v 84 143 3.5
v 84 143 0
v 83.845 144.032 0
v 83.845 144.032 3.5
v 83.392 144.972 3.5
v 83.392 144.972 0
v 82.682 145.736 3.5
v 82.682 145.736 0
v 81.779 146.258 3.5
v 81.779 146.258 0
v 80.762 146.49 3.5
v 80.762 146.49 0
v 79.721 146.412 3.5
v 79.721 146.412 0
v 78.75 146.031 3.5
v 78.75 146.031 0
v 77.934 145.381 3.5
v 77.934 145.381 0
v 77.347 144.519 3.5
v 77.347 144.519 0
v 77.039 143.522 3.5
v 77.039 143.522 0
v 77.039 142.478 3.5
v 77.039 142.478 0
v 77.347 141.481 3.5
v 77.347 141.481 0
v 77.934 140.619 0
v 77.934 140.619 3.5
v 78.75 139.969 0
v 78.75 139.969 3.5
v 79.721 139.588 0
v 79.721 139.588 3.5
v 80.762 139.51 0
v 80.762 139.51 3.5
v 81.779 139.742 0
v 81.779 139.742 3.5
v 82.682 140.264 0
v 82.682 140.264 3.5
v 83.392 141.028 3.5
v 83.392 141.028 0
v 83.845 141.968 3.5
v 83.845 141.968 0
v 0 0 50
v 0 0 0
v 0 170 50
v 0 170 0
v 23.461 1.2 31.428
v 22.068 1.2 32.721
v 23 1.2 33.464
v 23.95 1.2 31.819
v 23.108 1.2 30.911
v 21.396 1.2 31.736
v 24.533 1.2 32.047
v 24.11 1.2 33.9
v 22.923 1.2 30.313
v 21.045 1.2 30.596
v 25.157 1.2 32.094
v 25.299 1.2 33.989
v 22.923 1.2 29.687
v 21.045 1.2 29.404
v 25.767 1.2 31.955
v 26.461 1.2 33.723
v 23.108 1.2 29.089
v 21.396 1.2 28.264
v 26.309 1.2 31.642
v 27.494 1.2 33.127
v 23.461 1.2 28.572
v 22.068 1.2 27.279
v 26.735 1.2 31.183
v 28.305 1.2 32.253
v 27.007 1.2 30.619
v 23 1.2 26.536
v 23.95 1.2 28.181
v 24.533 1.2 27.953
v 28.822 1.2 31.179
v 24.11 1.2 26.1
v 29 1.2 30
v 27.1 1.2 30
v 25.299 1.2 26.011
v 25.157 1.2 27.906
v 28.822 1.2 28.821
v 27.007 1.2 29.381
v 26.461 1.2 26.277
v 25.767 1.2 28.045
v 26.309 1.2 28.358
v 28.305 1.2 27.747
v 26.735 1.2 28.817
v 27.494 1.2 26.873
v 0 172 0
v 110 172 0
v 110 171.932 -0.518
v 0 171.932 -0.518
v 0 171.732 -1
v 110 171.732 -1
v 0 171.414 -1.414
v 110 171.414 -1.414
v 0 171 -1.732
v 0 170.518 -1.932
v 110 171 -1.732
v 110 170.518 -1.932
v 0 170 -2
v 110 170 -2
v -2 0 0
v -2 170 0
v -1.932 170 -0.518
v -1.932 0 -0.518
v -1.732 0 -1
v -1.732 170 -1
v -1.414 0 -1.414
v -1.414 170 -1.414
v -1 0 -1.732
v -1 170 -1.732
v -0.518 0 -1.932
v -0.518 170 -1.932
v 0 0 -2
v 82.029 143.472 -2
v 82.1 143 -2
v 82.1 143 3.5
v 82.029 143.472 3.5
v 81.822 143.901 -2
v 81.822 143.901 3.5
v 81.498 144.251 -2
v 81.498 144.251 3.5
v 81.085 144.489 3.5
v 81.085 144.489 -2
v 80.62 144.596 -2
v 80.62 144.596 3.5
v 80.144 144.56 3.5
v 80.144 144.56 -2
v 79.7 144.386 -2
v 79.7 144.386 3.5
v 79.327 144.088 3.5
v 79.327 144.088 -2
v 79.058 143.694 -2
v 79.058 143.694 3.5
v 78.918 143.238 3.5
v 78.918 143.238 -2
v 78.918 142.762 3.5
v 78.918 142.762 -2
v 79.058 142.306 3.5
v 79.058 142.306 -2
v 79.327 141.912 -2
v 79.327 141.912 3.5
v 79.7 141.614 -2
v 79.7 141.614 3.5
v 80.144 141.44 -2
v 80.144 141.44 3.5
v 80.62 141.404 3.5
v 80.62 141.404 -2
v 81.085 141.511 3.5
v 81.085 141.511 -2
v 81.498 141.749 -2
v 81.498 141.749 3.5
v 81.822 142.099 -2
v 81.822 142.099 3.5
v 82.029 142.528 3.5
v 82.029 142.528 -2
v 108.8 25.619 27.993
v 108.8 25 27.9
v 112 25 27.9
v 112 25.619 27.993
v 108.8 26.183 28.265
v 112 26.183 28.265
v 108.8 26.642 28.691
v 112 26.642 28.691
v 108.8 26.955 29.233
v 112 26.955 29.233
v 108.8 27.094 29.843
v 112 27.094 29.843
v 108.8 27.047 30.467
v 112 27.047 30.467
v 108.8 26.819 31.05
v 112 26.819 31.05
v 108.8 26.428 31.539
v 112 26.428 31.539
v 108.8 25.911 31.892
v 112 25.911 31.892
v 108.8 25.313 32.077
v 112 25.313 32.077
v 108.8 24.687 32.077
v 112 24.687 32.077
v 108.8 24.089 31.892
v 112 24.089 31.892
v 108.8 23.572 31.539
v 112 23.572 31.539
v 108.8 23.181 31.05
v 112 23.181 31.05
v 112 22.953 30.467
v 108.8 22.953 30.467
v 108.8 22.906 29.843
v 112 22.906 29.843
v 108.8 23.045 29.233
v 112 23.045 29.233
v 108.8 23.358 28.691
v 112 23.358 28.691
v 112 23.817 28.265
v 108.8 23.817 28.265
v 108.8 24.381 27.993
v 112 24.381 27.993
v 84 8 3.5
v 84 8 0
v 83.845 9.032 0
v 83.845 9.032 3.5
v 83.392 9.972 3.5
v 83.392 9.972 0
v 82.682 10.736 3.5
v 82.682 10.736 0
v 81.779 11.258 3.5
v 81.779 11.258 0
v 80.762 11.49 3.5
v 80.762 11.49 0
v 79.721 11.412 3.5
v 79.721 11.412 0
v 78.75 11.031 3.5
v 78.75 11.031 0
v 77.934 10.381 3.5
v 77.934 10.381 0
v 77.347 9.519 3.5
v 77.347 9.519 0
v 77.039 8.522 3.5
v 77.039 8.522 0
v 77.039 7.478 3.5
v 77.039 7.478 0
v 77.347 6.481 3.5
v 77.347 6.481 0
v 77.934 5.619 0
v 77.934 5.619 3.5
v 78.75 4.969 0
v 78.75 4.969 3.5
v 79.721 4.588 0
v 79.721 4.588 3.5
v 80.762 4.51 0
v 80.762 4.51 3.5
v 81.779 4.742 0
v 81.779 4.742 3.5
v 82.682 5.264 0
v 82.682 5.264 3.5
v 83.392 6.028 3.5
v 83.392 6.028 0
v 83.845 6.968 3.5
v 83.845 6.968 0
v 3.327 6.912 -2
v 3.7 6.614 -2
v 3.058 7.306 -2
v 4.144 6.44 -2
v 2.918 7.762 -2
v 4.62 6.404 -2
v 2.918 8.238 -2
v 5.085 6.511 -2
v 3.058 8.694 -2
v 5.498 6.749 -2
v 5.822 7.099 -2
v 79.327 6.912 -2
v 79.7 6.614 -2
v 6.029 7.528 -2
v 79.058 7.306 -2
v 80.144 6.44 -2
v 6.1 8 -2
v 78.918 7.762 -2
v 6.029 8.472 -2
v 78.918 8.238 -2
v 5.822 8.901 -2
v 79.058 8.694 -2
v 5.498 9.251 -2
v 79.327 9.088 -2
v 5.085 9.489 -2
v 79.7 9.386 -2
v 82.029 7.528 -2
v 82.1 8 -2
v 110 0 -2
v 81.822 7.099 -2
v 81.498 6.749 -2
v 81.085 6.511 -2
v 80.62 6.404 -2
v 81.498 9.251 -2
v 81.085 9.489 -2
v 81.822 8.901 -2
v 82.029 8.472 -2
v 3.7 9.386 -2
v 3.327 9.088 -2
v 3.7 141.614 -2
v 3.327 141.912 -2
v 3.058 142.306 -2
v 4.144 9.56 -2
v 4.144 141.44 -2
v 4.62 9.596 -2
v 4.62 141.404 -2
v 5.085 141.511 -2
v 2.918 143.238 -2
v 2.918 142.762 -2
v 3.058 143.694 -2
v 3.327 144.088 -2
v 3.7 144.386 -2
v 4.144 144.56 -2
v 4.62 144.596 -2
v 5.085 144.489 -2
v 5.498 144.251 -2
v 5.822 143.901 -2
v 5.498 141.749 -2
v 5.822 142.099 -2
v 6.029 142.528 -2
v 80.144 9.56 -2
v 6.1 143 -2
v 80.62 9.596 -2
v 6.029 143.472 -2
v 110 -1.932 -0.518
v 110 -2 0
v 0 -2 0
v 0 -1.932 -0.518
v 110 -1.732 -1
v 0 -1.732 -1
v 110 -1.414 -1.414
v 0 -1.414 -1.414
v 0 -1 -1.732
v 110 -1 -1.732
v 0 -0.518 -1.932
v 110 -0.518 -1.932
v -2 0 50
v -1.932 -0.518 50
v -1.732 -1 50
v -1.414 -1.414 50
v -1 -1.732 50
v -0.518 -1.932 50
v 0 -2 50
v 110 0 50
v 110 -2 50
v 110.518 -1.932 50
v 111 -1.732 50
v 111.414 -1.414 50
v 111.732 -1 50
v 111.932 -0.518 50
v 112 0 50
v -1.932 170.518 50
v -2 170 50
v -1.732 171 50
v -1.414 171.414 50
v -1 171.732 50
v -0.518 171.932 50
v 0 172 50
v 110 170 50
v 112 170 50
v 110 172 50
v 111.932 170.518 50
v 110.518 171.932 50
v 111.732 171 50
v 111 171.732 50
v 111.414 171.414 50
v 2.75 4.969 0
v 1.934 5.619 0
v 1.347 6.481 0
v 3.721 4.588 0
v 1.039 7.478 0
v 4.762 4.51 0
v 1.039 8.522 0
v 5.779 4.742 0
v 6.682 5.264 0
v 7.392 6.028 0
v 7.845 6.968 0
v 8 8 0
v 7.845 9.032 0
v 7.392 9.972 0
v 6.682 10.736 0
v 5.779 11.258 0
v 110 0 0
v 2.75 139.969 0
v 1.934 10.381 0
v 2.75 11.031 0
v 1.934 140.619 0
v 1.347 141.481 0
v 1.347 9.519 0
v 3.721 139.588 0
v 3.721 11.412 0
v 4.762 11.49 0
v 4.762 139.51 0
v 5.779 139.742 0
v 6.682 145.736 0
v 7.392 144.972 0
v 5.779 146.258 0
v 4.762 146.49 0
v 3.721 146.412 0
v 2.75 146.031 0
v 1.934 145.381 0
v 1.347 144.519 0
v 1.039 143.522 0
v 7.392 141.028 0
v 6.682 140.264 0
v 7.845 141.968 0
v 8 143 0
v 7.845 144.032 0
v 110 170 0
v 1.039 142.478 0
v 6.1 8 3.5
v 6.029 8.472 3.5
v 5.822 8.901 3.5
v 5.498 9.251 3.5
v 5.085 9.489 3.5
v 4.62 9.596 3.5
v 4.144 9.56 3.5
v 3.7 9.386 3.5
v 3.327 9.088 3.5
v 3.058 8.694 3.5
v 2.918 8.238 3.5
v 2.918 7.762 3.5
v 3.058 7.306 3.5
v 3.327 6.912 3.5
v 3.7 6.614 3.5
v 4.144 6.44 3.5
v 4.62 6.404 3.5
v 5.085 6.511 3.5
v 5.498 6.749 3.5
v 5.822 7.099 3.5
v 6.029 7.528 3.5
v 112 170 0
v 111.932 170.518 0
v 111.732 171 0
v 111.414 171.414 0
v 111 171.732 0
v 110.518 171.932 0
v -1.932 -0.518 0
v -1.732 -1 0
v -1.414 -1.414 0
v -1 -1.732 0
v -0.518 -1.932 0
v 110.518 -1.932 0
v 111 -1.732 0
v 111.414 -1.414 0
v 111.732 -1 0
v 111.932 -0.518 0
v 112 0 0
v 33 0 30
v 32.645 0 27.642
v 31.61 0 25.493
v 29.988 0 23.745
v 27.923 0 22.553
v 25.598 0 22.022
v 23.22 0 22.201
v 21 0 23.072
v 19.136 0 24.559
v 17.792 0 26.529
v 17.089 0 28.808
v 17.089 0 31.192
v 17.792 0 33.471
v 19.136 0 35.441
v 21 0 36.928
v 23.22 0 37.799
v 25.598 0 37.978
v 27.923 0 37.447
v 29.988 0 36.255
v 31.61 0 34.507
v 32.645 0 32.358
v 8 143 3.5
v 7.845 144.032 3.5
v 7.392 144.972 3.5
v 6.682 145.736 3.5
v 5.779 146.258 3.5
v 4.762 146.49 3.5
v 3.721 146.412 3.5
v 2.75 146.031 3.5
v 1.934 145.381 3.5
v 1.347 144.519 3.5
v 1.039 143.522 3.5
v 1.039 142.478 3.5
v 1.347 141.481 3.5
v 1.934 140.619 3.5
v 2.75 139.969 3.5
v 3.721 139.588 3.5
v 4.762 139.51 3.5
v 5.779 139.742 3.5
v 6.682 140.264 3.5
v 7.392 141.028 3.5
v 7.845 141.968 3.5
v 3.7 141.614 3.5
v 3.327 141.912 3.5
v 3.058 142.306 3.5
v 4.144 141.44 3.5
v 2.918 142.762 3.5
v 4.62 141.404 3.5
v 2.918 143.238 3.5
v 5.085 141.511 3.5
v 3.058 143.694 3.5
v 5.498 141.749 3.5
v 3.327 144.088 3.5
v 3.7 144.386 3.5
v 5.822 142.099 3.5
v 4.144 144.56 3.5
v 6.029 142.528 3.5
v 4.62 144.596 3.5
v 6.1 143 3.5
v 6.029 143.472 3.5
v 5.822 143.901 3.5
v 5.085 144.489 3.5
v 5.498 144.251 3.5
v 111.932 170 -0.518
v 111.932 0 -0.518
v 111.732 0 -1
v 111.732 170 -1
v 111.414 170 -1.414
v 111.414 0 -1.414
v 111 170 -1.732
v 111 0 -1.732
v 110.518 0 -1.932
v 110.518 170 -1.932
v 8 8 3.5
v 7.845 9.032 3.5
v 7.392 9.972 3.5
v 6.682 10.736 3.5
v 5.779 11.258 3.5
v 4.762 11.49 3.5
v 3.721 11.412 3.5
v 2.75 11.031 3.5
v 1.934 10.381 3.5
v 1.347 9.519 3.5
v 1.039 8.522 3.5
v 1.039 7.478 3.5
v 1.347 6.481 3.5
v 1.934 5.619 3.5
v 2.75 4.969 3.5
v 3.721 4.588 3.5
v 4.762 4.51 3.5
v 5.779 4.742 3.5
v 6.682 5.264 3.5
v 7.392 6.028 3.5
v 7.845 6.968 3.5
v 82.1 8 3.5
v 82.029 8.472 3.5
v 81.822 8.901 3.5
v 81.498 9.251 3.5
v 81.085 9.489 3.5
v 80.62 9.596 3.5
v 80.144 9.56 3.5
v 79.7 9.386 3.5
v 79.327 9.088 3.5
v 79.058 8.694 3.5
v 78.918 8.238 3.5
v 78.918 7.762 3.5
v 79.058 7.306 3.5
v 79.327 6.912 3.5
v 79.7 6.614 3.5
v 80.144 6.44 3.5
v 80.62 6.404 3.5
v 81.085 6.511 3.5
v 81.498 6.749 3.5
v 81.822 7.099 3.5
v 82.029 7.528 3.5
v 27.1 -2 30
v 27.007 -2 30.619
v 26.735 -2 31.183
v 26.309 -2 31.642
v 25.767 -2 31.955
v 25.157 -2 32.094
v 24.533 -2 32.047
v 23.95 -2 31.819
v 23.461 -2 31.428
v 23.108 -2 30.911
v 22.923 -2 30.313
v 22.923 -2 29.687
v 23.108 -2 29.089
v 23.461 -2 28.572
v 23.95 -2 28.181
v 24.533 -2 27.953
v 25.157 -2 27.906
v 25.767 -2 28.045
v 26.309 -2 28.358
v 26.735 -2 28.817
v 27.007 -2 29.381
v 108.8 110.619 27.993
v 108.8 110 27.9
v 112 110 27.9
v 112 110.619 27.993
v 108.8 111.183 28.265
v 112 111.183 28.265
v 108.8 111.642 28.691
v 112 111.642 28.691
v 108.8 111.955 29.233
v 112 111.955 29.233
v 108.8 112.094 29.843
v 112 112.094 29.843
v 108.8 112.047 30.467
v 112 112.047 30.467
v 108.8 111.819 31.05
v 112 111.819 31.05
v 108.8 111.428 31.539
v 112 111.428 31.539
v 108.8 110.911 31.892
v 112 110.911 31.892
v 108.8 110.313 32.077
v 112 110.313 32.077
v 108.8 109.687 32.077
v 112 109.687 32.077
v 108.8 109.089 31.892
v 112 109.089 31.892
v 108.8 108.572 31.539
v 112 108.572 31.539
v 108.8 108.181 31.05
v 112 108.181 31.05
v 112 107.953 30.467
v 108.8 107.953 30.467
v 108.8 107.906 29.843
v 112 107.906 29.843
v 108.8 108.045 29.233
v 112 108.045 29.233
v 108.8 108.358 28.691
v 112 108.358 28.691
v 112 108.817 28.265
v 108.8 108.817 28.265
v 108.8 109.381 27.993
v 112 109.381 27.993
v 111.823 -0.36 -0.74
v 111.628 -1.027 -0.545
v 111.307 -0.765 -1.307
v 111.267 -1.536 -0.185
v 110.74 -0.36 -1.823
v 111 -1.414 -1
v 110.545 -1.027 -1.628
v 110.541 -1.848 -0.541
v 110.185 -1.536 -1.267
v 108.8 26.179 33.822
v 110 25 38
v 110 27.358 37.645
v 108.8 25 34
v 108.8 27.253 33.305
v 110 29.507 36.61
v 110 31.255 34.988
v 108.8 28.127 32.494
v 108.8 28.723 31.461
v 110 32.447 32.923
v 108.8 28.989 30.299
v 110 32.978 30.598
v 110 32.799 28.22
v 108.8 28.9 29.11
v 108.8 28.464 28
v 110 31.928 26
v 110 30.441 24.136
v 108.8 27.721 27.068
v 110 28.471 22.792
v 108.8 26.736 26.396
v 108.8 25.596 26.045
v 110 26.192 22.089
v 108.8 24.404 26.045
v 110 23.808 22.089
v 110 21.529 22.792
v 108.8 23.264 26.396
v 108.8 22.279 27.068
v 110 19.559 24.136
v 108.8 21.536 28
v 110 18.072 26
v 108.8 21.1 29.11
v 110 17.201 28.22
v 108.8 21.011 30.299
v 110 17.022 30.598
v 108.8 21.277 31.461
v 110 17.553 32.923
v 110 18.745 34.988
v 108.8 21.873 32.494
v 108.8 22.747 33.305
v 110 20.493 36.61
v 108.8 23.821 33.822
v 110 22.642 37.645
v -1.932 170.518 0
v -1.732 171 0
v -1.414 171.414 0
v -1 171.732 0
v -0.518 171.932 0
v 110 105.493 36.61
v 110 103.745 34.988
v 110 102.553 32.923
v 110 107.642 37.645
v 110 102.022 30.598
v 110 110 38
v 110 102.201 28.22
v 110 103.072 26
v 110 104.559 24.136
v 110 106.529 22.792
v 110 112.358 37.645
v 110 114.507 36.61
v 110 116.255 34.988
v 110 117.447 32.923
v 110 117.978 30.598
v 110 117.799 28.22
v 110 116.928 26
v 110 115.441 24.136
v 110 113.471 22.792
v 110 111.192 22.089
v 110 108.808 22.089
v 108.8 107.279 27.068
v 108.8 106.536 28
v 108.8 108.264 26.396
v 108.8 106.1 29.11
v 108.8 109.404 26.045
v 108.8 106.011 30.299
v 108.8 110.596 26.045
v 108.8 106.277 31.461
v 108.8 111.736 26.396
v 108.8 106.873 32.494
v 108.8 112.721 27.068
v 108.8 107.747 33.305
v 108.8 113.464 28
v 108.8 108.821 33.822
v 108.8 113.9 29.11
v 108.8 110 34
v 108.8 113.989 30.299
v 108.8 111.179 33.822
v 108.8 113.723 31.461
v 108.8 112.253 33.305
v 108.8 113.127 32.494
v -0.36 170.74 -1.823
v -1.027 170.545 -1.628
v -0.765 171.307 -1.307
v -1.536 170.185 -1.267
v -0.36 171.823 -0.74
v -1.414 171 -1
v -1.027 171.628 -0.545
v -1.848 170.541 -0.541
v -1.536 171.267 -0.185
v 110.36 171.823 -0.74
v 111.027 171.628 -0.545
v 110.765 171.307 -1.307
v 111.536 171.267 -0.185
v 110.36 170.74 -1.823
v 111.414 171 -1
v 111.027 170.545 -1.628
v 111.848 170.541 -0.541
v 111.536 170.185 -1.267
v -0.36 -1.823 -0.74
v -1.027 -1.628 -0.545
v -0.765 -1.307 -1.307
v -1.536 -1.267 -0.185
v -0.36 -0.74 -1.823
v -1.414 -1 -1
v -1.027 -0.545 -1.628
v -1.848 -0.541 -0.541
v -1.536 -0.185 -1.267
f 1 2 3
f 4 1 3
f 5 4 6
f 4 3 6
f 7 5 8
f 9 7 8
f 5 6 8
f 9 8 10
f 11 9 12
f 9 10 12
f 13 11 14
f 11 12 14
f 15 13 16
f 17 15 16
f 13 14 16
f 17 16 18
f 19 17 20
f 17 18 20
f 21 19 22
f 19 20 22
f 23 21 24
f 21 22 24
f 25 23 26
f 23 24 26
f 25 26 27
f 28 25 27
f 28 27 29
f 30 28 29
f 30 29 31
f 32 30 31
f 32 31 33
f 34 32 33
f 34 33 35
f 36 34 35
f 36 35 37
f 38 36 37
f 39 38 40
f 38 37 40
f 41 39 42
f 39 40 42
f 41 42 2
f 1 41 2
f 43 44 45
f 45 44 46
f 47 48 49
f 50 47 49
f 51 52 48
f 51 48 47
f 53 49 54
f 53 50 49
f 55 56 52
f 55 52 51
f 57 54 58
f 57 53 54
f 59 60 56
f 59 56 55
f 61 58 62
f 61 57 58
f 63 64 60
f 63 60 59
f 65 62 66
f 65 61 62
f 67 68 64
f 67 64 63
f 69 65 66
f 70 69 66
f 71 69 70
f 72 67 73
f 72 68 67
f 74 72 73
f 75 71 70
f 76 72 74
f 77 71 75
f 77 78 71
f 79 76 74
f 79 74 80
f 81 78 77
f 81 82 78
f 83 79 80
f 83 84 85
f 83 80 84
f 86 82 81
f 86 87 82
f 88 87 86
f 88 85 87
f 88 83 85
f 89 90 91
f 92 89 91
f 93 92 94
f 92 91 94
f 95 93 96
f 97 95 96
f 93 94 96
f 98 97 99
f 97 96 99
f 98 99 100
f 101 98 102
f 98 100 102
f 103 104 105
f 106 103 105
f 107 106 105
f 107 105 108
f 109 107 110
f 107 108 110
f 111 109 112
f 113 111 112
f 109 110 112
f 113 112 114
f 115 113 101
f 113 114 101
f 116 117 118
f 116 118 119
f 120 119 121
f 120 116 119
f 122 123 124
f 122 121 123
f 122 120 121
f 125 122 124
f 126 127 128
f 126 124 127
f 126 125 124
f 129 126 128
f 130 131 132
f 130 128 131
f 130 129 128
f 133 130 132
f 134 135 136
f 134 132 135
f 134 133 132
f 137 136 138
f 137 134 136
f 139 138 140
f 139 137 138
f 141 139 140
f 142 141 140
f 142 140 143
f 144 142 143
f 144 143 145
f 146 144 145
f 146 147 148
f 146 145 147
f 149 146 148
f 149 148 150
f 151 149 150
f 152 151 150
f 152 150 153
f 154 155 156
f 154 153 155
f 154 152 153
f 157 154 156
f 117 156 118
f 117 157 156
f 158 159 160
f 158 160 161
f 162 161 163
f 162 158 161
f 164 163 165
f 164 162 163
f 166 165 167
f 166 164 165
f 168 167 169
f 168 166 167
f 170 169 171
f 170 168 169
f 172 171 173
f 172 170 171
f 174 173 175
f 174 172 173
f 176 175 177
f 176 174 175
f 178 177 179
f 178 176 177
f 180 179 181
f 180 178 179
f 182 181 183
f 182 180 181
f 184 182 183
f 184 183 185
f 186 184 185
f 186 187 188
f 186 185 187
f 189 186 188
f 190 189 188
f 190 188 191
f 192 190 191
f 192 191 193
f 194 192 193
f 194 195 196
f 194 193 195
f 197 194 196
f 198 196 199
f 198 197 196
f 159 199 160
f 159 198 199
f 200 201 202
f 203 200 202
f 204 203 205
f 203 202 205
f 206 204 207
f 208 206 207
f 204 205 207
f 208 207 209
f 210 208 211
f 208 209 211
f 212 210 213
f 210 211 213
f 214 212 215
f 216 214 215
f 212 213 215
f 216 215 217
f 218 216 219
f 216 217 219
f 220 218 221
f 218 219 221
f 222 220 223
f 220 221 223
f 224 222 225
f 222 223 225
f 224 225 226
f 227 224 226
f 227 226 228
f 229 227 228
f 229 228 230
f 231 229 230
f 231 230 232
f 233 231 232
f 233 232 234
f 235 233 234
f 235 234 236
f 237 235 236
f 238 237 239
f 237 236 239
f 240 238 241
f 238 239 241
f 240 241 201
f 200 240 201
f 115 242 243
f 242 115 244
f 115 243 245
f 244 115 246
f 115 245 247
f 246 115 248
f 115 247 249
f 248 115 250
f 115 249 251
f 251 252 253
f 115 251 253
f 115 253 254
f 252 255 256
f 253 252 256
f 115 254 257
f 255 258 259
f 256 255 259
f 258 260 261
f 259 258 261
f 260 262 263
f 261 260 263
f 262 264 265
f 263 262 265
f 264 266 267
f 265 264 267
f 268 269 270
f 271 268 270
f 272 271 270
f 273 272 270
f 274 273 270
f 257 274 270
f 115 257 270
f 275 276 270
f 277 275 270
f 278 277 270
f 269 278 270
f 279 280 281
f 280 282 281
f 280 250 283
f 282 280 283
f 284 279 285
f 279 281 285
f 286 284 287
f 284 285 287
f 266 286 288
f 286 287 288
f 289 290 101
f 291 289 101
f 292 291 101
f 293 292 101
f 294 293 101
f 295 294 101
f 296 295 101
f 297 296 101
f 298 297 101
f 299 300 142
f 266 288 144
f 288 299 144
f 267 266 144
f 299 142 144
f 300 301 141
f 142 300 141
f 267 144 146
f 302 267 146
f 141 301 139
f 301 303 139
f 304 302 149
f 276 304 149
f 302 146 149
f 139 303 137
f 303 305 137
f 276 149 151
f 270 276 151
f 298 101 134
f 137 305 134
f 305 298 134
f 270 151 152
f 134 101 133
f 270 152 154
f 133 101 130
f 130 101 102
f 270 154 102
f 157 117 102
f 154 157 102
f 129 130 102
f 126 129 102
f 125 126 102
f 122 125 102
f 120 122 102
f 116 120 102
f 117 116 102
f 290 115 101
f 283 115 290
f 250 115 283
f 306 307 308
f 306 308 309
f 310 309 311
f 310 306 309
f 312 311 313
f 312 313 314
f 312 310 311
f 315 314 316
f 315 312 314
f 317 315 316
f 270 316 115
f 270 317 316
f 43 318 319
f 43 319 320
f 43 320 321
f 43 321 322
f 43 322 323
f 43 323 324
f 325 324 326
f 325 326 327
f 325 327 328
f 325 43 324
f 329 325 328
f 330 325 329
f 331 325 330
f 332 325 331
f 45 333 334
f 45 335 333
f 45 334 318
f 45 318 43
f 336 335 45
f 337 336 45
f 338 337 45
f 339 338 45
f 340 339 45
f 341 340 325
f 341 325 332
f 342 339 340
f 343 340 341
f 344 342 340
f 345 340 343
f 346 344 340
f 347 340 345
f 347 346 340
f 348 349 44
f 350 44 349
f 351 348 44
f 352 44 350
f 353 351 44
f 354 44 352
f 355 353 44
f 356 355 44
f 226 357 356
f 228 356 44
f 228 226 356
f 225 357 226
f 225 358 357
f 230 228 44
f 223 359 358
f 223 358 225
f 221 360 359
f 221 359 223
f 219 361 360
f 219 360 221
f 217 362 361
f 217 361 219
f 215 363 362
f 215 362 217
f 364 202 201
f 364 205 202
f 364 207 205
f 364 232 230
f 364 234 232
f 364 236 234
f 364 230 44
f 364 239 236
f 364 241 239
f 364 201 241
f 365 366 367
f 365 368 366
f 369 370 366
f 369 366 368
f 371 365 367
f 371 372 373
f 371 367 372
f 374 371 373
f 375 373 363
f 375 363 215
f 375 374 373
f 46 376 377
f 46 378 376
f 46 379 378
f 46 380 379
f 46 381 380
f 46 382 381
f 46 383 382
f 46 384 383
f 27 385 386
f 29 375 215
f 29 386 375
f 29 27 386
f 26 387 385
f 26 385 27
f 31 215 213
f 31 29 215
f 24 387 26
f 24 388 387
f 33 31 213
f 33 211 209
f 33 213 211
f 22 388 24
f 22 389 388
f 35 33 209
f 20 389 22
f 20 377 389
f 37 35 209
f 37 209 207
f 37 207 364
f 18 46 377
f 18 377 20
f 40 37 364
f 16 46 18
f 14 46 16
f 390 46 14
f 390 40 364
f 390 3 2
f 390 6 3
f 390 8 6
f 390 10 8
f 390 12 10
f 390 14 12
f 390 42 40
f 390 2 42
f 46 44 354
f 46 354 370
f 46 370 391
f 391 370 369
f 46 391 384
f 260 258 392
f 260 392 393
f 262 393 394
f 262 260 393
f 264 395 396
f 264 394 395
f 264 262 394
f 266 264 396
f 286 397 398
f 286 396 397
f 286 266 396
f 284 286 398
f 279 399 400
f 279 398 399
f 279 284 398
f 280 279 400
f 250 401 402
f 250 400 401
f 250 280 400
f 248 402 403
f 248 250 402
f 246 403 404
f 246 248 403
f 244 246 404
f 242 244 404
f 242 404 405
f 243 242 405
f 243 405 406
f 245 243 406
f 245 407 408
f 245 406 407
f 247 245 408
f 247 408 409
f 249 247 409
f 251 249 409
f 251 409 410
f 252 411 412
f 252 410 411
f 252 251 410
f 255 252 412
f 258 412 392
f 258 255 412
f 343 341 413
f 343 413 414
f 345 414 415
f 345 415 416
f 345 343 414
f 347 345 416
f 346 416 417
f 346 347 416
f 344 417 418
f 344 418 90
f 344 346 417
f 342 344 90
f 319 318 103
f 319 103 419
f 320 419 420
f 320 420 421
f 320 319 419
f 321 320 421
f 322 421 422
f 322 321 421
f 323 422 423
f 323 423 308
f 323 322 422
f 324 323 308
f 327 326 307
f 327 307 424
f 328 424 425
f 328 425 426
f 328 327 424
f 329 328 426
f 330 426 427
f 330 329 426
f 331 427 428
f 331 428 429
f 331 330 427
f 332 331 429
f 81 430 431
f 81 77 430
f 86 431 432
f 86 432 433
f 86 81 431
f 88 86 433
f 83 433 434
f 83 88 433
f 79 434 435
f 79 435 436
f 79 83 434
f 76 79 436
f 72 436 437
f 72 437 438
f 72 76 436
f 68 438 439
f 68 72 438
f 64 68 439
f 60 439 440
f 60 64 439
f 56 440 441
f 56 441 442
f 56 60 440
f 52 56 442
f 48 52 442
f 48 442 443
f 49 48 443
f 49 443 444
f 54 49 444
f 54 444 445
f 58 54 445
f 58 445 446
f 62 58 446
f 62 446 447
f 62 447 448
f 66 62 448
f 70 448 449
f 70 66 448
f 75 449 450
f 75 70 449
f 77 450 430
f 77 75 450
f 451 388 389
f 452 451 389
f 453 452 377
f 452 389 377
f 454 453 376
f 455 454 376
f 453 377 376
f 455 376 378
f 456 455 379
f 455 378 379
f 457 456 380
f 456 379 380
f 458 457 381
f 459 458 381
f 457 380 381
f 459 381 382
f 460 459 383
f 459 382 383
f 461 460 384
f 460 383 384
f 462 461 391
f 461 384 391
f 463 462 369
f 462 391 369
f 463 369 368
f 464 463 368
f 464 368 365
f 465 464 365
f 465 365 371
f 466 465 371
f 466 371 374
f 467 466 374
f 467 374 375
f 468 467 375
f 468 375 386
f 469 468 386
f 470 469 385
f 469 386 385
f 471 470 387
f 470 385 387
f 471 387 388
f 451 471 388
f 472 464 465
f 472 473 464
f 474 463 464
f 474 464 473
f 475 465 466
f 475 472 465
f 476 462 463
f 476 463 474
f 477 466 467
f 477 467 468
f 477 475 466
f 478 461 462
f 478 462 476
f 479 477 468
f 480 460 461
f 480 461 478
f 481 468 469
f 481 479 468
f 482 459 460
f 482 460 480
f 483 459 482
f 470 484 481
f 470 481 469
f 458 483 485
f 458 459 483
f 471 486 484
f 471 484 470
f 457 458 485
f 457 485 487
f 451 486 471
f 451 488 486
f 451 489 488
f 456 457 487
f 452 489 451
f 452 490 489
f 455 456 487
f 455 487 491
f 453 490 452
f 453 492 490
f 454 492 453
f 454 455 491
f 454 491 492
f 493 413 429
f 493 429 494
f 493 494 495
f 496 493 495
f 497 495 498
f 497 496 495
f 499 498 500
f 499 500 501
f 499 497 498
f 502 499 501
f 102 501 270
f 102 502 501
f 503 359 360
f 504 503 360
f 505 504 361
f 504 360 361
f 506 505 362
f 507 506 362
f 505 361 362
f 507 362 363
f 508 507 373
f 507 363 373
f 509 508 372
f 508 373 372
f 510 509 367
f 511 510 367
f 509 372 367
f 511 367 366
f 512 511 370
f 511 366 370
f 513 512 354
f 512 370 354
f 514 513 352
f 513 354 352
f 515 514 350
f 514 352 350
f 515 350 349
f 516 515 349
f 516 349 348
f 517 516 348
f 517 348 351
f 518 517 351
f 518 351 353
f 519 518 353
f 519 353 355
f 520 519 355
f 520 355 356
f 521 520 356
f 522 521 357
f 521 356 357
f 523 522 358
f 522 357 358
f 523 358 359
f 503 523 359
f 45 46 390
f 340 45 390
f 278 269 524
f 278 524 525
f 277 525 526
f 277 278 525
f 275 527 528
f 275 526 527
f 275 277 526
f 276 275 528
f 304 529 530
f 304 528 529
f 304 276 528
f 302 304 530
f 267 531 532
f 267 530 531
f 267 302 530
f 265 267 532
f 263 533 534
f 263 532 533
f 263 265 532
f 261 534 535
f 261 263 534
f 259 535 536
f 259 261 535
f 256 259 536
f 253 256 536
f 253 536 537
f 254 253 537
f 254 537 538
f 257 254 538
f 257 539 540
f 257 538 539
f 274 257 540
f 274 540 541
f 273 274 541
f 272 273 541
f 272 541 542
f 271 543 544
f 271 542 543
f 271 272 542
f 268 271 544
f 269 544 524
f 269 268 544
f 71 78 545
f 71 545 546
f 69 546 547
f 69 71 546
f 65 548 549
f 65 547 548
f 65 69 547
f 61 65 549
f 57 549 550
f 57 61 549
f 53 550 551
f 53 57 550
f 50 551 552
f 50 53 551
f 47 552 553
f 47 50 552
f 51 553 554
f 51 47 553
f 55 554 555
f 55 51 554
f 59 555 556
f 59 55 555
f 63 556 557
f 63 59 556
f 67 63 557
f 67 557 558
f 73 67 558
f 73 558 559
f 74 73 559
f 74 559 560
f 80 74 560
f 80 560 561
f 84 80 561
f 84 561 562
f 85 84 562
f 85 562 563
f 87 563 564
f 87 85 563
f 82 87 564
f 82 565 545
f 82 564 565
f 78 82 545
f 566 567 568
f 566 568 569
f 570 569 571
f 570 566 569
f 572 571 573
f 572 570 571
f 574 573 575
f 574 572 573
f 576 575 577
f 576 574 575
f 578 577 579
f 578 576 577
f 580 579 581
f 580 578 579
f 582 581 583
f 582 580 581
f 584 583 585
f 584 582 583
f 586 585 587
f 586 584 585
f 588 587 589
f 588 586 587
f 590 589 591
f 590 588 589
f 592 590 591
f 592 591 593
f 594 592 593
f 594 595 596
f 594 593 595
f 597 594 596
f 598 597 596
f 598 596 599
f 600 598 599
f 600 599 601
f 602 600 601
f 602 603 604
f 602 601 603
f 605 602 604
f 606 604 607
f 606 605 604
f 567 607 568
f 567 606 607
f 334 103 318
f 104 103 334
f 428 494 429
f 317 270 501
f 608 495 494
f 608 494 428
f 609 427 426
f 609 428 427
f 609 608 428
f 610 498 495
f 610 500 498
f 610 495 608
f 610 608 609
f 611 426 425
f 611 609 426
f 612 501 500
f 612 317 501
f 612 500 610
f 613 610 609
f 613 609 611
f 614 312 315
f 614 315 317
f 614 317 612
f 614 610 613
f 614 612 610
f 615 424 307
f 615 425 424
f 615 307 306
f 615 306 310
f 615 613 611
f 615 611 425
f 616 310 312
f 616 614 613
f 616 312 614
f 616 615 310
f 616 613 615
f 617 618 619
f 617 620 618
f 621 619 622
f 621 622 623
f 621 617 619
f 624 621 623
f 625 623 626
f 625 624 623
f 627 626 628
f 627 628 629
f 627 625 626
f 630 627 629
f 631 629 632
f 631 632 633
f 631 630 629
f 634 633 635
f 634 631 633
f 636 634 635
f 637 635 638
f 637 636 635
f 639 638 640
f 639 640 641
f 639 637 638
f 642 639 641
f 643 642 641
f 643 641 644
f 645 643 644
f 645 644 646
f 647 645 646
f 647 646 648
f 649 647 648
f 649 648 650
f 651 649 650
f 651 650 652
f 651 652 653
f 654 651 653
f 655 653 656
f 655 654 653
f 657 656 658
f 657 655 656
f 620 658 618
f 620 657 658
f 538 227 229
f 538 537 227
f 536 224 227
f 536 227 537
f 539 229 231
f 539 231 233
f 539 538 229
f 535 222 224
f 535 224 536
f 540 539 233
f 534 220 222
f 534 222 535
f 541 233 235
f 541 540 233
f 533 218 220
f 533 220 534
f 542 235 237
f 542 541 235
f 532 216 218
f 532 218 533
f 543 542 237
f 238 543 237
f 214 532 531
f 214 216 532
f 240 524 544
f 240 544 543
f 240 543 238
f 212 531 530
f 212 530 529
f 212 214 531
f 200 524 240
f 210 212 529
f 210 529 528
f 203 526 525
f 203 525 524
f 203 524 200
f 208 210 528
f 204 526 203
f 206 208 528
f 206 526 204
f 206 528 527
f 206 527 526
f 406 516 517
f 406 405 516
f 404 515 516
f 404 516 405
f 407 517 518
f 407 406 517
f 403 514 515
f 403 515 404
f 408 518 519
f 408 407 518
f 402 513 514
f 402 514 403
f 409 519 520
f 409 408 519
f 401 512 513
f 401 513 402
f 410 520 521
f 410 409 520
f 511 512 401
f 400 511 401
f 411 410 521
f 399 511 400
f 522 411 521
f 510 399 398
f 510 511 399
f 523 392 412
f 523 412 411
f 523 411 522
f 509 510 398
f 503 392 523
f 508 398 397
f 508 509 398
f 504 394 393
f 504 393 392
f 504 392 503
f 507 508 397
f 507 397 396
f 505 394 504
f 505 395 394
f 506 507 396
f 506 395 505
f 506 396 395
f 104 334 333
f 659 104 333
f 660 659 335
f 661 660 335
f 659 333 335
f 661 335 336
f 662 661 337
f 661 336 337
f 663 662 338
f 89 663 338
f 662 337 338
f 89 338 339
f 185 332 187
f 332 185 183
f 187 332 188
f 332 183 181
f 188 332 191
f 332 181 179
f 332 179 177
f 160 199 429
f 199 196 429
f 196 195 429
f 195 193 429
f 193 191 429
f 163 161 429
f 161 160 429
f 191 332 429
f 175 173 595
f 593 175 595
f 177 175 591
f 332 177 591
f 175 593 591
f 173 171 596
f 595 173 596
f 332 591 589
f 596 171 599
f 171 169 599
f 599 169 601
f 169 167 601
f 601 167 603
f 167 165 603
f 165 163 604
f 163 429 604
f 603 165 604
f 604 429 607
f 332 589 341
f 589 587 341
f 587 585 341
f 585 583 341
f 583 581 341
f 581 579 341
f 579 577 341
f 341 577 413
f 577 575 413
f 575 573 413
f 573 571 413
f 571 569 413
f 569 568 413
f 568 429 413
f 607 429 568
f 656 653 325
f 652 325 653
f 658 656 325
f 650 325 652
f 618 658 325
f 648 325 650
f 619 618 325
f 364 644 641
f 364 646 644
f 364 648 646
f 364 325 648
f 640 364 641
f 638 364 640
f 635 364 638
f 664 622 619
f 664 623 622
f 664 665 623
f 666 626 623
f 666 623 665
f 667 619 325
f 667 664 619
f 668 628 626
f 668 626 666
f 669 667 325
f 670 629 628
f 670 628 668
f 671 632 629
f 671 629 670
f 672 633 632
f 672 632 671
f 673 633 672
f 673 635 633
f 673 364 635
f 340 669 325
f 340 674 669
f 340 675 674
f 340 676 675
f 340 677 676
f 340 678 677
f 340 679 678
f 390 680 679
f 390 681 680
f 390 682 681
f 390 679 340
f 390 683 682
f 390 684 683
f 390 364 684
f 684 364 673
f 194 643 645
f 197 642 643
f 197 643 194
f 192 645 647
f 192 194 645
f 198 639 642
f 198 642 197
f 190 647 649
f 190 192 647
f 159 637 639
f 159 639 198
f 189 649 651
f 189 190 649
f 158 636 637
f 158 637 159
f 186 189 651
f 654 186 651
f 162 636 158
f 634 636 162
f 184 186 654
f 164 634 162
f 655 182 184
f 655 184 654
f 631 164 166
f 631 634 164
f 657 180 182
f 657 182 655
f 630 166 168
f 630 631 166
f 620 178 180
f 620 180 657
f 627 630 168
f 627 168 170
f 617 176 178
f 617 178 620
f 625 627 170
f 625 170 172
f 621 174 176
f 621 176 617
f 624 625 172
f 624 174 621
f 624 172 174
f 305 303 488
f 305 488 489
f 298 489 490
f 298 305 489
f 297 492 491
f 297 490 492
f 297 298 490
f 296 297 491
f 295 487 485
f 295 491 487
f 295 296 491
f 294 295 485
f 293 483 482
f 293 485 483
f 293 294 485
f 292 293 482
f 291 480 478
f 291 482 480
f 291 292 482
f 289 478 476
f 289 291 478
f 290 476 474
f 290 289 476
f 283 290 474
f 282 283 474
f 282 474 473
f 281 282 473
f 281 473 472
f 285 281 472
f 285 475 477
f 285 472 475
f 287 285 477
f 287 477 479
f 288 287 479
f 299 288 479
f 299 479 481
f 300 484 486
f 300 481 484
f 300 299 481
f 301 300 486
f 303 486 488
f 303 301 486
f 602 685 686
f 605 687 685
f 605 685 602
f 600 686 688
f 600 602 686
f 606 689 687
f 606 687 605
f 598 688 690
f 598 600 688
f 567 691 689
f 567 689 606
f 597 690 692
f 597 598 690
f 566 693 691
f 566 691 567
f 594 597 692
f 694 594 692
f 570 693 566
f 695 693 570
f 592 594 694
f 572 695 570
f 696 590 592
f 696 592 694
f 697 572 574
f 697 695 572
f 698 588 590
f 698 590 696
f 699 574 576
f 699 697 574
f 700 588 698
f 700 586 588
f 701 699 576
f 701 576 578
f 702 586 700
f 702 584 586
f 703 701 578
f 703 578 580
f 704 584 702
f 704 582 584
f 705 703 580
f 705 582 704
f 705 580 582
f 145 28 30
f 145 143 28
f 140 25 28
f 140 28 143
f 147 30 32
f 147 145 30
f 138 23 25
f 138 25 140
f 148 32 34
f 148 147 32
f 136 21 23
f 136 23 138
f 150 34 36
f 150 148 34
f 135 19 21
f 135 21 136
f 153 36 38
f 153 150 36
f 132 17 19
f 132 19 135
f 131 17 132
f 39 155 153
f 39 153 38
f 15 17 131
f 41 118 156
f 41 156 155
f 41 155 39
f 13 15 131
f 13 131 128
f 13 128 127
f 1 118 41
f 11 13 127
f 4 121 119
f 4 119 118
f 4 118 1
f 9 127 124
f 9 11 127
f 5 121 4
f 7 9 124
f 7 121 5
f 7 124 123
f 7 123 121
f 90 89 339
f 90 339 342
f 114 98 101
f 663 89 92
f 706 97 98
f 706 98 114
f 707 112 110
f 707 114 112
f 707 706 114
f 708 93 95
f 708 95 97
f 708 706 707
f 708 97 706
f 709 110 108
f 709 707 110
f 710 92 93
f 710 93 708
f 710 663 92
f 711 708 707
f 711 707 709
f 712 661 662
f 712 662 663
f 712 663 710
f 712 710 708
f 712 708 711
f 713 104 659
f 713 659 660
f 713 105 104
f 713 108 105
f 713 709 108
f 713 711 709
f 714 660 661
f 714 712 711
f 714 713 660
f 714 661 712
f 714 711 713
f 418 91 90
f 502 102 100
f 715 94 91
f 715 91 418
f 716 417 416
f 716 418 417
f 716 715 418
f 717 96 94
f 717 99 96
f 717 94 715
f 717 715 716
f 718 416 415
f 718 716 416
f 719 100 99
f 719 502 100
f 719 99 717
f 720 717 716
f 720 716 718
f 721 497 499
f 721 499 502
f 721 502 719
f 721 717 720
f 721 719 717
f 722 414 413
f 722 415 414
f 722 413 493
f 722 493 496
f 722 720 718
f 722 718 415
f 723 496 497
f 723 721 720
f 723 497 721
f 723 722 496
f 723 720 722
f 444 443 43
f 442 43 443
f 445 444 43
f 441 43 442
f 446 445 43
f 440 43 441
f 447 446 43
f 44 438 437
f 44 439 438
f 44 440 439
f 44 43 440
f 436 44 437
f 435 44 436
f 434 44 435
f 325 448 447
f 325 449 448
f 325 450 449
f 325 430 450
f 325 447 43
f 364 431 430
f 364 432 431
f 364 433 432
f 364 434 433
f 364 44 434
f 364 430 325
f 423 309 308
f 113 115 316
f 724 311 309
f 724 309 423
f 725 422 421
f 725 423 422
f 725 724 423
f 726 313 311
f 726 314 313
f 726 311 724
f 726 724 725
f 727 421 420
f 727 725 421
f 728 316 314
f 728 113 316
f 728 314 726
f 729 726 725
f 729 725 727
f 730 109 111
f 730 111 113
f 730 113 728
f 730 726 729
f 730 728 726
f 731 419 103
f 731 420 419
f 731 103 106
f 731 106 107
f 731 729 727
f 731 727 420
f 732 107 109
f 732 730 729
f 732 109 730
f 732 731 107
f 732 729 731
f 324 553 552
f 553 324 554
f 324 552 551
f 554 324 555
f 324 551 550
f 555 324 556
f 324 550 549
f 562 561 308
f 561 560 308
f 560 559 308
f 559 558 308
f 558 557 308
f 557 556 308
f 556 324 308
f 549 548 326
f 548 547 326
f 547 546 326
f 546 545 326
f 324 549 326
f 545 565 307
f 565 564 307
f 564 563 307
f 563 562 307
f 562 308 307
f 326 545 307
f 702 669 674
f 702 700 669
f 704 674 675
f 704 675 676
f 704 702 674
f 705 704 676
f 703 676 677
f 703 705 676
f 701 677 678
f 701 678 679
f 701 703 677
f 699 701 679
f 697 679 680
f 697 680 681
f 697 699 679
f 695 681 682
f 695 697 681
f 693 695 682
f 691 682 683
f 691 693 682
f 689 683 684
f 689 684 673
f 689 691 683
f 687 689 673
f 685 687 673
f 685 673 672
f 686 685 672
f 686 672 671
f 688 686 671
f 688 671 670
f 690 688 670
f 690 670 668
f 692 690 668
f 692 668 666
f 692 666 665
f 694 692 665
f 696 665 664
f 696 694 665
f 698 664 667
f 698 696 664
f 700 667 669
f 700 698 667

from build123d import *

# Parameters (mm, degrees)
CYLINDER002_R            = 2.1
CYLINDER002_DEPTH        = 10
CYLINDER002_PITCH_ANGLE  = 90
CYLINDER001_R            = 1.6
CYLINDER001_DEPTH        = 7
ARRAY001_X_COUNT         = 2
ARRAY001_X_PITCH         = 76
ARRAY001_Y_COUNT         = 2
ARRAY001_Y_PITCH         = 135
CLONE003_ROLL_ANGLE      = 90
CLONE003_PLACEMENT_ANGLE = -90
CYLINDER_R               = 3.5
CYLINDER_DEPTH           = 3.5
ARRAY_X_COUNT            = 2
ARRAY_X_PITCH            = 76
ARRAY_Y_COUNT            = 2
ARRAY_Y_PITCH            = 135
CONE_PITCH_ANGLE         = -90
CLONE002_ROLL_ANGLE      = -90
CLONE002_PLACEMENT_ANGLE = -90
BOX_W                    = 110
BOX_H                    = 170
BOX_DEPTH                = 50
THICKNESS_T              = 2


with BuildPart() as cylinder002:
    # Cylinder002 → Cylinder002 (new body)
    with BuildSketch(Plane.XY):
        Circle(CYLINDER002_R)
    extrude(amount=CYLINDER002_DEPTH)


with BuildPart() as cylinder002_1:
    # Cylinder002 pitch: moved
    add(cylinder002.part.rotate(Axis((0, 0, 0), (0, 1, 0)), CYLINDER002_PITCH_ANGLE))


with BuildPart() as cylinder002_2:
    # Cylinder002 placement: moved
    add(cylinder002_1.part.moved(Location((108, 25, 30))))


with BuildPart() as clone_of_cylinder002:
    # Clone001 base: copy of Cylinder002
    add(cylinder002_2.part)


with BuildPart() as clone_of_cylinder002_1:
    # Clone001 placement: moved
    add(clone_of_cylinder002.part.moved(Location((0, 85, 0))))


with BuildPart() as mount_holes:
    # Cylinder001 → Cylinder001 (new body)
    with BuildSketch(Plane.XY.offset(-3)):
        Circle(CYLINDER001_R)
    extrude(amount=CYLINDER001_DEPTH)

    # Array001 X: mount_holes ×2


with BuildPart() as mount_holes_1:
    add(mount_holes.part)
    with Locations(*[(i * ARRAY001_X_PITCH, 0, 0) for i in range(1, ARRAY001_X_COUNT)]):
        add(mount_holes.part)

    # Array001 Y: mount_holes ×2


with BuildPart() as mount_holes_2:
    add(mount_holes_1.part)
    with Locations(*[(0, i * ARRAY001_Y_PITCH, 0) for i in range(1, ARRAY001_Y_COUNT)]):
        add(mount_holes_1.part)


with BuildPart() as mount_holes_3:
    # Array001 placement: moved
    add(mount_holes_2.part.moved(Location((4.5, 8, 0))))


with BuildPart() as fusion001:
    # Clone003 base: copy of Cylinder002
    add(cylinder002_2.part)


with BuildPart() as fusion001_1:
    # Clone003 roll: moved
    add(fusion001.part.rotate(Axis((0, 0, 0), (1, 0, 0)), CLONE003_ROLL_ANGLE))


with BuildPart() as fusion001_2:
    # Clone003 placement: moved
    add(fusion001_1.part.moved(Location((55, 113, 5))).rotate(Axis((55, 113, 5), (0, 0, 1)), CLONE003_PLACEMENT_ANGLE))

    # Fusion001: union Clone of Cylinder002, Cylinder002, mount_holes
    add(clone_of_cylinder002_1.part)
    add(cylinder002_2.part)
    add(mount_holes_3.part)


with BuildPart() as mount_points:
    # Cylinder → Cylinder (new body)
    with BuildSketch(Plane.XY):
        Circle(CYLINDER_R)
    extrude(amount=CYLINDER_DEPTH)

    # Array X: mount_points ×2


with BuildPart() as mount_points_1:
    add(mount_points.part)
    with Locations(*[(i * ARRAY_X_PITCH, 0, 0) for i in range(1, ARRAY_X_COUNT)]):
        add(mount_points.part)

    # Array Y: mount_points ×2


with BuildPart() as mount_points_2:
    add(mount_points_1.part)
    with Locations(*[(0, i * ARRAY_Y_PITCH, 0) for i in range(1, ARRAY_Y_COUNT)]):
        add(mount_points_1.part)


with BuildPart() as mount_points_3:
    # Array placement: moved
    add(mount_points_2.part.moved(Location((4.5, 8, 0))))


with BuildPart() as cone:
    # Cone → Cone (revolve)
    with BuildSketch(Plane.XZ):
        Polygon((0, 0), (8, 0), (4, 1.2), (0, 1.2), align=None)
    revolve(axis=Axis((0, 0, 0), (0, 0, 1)))


with BuildPart() as cone_1:
    # Cone pitch: moved
    add(cone.part.rotate(Axis((0, 0, 0), (0, 1, 0)), CONE_PITCH_ANGLE))


with BuildPart() as cone_2:
    # Cone placement: moved
    add(cone_1.part.moved(Location((110, 25, 30))))


with BuildPart() as clone_of_cone:
    # Clone base: copy of Cone
    add(cone_2.part)


with BuildPart() as clone_of_cone_1:
    # Clone placement: moved
    add(clone_of_cone.part.moved(Location((0, 85, 0))))


with BuildPart() as clone_of_cone001:
    # Clone002 base: copy of Cone
    add(cone_2.part)


with BuildPart() as clone_of_cone001_1:
    # Clone002 roll: moved
    add(clone_of_cone001.part.rotate(Axis((0, 0, 0), (1, 0, 0)), CLONE002_ROLL_ANGLE))


with BuildPart() as clone_of_cone001_2:
    # Clone002 placement: moved
    add(clone_of_cone001_1.part.moved(Location((-5, 110, 55))).rotate(Axis((-5, 110, 55), (0, 0, 1)), CLONE002_PLACEMENT_ANGLE))


with BuildPart() as case_with_mount_holes:
    # Box → Box (new body)
    with BuildSketch(Plane.XY):
        with Locations((55, 85)):
            Rectangle(BOX_W, BOX_H)
    extrude(amount=BOX_DEPTH)

    # Thickness
    thickness_openings = [case_with_mount_holes.faces().sort_by_distance(p)[0] for p in [
        (55, 85, 50),
    ]]
    offset(amount=THICKNESS_T, openings=thickness_openings)

    # Fusion: union mount_points, Clone of Cone, Cone, Clone of Cone001
    add(mount_points_3.part)
    add(clone_of_cone_1.part)
    add(cone_2.part)
    add(clone_of_cone001_2.part)

    # Cut: cut Fusion001
    add(fusion001_2.part, mode=Mode.SUBTRACT)


solid = case_with_mount_holes.part
